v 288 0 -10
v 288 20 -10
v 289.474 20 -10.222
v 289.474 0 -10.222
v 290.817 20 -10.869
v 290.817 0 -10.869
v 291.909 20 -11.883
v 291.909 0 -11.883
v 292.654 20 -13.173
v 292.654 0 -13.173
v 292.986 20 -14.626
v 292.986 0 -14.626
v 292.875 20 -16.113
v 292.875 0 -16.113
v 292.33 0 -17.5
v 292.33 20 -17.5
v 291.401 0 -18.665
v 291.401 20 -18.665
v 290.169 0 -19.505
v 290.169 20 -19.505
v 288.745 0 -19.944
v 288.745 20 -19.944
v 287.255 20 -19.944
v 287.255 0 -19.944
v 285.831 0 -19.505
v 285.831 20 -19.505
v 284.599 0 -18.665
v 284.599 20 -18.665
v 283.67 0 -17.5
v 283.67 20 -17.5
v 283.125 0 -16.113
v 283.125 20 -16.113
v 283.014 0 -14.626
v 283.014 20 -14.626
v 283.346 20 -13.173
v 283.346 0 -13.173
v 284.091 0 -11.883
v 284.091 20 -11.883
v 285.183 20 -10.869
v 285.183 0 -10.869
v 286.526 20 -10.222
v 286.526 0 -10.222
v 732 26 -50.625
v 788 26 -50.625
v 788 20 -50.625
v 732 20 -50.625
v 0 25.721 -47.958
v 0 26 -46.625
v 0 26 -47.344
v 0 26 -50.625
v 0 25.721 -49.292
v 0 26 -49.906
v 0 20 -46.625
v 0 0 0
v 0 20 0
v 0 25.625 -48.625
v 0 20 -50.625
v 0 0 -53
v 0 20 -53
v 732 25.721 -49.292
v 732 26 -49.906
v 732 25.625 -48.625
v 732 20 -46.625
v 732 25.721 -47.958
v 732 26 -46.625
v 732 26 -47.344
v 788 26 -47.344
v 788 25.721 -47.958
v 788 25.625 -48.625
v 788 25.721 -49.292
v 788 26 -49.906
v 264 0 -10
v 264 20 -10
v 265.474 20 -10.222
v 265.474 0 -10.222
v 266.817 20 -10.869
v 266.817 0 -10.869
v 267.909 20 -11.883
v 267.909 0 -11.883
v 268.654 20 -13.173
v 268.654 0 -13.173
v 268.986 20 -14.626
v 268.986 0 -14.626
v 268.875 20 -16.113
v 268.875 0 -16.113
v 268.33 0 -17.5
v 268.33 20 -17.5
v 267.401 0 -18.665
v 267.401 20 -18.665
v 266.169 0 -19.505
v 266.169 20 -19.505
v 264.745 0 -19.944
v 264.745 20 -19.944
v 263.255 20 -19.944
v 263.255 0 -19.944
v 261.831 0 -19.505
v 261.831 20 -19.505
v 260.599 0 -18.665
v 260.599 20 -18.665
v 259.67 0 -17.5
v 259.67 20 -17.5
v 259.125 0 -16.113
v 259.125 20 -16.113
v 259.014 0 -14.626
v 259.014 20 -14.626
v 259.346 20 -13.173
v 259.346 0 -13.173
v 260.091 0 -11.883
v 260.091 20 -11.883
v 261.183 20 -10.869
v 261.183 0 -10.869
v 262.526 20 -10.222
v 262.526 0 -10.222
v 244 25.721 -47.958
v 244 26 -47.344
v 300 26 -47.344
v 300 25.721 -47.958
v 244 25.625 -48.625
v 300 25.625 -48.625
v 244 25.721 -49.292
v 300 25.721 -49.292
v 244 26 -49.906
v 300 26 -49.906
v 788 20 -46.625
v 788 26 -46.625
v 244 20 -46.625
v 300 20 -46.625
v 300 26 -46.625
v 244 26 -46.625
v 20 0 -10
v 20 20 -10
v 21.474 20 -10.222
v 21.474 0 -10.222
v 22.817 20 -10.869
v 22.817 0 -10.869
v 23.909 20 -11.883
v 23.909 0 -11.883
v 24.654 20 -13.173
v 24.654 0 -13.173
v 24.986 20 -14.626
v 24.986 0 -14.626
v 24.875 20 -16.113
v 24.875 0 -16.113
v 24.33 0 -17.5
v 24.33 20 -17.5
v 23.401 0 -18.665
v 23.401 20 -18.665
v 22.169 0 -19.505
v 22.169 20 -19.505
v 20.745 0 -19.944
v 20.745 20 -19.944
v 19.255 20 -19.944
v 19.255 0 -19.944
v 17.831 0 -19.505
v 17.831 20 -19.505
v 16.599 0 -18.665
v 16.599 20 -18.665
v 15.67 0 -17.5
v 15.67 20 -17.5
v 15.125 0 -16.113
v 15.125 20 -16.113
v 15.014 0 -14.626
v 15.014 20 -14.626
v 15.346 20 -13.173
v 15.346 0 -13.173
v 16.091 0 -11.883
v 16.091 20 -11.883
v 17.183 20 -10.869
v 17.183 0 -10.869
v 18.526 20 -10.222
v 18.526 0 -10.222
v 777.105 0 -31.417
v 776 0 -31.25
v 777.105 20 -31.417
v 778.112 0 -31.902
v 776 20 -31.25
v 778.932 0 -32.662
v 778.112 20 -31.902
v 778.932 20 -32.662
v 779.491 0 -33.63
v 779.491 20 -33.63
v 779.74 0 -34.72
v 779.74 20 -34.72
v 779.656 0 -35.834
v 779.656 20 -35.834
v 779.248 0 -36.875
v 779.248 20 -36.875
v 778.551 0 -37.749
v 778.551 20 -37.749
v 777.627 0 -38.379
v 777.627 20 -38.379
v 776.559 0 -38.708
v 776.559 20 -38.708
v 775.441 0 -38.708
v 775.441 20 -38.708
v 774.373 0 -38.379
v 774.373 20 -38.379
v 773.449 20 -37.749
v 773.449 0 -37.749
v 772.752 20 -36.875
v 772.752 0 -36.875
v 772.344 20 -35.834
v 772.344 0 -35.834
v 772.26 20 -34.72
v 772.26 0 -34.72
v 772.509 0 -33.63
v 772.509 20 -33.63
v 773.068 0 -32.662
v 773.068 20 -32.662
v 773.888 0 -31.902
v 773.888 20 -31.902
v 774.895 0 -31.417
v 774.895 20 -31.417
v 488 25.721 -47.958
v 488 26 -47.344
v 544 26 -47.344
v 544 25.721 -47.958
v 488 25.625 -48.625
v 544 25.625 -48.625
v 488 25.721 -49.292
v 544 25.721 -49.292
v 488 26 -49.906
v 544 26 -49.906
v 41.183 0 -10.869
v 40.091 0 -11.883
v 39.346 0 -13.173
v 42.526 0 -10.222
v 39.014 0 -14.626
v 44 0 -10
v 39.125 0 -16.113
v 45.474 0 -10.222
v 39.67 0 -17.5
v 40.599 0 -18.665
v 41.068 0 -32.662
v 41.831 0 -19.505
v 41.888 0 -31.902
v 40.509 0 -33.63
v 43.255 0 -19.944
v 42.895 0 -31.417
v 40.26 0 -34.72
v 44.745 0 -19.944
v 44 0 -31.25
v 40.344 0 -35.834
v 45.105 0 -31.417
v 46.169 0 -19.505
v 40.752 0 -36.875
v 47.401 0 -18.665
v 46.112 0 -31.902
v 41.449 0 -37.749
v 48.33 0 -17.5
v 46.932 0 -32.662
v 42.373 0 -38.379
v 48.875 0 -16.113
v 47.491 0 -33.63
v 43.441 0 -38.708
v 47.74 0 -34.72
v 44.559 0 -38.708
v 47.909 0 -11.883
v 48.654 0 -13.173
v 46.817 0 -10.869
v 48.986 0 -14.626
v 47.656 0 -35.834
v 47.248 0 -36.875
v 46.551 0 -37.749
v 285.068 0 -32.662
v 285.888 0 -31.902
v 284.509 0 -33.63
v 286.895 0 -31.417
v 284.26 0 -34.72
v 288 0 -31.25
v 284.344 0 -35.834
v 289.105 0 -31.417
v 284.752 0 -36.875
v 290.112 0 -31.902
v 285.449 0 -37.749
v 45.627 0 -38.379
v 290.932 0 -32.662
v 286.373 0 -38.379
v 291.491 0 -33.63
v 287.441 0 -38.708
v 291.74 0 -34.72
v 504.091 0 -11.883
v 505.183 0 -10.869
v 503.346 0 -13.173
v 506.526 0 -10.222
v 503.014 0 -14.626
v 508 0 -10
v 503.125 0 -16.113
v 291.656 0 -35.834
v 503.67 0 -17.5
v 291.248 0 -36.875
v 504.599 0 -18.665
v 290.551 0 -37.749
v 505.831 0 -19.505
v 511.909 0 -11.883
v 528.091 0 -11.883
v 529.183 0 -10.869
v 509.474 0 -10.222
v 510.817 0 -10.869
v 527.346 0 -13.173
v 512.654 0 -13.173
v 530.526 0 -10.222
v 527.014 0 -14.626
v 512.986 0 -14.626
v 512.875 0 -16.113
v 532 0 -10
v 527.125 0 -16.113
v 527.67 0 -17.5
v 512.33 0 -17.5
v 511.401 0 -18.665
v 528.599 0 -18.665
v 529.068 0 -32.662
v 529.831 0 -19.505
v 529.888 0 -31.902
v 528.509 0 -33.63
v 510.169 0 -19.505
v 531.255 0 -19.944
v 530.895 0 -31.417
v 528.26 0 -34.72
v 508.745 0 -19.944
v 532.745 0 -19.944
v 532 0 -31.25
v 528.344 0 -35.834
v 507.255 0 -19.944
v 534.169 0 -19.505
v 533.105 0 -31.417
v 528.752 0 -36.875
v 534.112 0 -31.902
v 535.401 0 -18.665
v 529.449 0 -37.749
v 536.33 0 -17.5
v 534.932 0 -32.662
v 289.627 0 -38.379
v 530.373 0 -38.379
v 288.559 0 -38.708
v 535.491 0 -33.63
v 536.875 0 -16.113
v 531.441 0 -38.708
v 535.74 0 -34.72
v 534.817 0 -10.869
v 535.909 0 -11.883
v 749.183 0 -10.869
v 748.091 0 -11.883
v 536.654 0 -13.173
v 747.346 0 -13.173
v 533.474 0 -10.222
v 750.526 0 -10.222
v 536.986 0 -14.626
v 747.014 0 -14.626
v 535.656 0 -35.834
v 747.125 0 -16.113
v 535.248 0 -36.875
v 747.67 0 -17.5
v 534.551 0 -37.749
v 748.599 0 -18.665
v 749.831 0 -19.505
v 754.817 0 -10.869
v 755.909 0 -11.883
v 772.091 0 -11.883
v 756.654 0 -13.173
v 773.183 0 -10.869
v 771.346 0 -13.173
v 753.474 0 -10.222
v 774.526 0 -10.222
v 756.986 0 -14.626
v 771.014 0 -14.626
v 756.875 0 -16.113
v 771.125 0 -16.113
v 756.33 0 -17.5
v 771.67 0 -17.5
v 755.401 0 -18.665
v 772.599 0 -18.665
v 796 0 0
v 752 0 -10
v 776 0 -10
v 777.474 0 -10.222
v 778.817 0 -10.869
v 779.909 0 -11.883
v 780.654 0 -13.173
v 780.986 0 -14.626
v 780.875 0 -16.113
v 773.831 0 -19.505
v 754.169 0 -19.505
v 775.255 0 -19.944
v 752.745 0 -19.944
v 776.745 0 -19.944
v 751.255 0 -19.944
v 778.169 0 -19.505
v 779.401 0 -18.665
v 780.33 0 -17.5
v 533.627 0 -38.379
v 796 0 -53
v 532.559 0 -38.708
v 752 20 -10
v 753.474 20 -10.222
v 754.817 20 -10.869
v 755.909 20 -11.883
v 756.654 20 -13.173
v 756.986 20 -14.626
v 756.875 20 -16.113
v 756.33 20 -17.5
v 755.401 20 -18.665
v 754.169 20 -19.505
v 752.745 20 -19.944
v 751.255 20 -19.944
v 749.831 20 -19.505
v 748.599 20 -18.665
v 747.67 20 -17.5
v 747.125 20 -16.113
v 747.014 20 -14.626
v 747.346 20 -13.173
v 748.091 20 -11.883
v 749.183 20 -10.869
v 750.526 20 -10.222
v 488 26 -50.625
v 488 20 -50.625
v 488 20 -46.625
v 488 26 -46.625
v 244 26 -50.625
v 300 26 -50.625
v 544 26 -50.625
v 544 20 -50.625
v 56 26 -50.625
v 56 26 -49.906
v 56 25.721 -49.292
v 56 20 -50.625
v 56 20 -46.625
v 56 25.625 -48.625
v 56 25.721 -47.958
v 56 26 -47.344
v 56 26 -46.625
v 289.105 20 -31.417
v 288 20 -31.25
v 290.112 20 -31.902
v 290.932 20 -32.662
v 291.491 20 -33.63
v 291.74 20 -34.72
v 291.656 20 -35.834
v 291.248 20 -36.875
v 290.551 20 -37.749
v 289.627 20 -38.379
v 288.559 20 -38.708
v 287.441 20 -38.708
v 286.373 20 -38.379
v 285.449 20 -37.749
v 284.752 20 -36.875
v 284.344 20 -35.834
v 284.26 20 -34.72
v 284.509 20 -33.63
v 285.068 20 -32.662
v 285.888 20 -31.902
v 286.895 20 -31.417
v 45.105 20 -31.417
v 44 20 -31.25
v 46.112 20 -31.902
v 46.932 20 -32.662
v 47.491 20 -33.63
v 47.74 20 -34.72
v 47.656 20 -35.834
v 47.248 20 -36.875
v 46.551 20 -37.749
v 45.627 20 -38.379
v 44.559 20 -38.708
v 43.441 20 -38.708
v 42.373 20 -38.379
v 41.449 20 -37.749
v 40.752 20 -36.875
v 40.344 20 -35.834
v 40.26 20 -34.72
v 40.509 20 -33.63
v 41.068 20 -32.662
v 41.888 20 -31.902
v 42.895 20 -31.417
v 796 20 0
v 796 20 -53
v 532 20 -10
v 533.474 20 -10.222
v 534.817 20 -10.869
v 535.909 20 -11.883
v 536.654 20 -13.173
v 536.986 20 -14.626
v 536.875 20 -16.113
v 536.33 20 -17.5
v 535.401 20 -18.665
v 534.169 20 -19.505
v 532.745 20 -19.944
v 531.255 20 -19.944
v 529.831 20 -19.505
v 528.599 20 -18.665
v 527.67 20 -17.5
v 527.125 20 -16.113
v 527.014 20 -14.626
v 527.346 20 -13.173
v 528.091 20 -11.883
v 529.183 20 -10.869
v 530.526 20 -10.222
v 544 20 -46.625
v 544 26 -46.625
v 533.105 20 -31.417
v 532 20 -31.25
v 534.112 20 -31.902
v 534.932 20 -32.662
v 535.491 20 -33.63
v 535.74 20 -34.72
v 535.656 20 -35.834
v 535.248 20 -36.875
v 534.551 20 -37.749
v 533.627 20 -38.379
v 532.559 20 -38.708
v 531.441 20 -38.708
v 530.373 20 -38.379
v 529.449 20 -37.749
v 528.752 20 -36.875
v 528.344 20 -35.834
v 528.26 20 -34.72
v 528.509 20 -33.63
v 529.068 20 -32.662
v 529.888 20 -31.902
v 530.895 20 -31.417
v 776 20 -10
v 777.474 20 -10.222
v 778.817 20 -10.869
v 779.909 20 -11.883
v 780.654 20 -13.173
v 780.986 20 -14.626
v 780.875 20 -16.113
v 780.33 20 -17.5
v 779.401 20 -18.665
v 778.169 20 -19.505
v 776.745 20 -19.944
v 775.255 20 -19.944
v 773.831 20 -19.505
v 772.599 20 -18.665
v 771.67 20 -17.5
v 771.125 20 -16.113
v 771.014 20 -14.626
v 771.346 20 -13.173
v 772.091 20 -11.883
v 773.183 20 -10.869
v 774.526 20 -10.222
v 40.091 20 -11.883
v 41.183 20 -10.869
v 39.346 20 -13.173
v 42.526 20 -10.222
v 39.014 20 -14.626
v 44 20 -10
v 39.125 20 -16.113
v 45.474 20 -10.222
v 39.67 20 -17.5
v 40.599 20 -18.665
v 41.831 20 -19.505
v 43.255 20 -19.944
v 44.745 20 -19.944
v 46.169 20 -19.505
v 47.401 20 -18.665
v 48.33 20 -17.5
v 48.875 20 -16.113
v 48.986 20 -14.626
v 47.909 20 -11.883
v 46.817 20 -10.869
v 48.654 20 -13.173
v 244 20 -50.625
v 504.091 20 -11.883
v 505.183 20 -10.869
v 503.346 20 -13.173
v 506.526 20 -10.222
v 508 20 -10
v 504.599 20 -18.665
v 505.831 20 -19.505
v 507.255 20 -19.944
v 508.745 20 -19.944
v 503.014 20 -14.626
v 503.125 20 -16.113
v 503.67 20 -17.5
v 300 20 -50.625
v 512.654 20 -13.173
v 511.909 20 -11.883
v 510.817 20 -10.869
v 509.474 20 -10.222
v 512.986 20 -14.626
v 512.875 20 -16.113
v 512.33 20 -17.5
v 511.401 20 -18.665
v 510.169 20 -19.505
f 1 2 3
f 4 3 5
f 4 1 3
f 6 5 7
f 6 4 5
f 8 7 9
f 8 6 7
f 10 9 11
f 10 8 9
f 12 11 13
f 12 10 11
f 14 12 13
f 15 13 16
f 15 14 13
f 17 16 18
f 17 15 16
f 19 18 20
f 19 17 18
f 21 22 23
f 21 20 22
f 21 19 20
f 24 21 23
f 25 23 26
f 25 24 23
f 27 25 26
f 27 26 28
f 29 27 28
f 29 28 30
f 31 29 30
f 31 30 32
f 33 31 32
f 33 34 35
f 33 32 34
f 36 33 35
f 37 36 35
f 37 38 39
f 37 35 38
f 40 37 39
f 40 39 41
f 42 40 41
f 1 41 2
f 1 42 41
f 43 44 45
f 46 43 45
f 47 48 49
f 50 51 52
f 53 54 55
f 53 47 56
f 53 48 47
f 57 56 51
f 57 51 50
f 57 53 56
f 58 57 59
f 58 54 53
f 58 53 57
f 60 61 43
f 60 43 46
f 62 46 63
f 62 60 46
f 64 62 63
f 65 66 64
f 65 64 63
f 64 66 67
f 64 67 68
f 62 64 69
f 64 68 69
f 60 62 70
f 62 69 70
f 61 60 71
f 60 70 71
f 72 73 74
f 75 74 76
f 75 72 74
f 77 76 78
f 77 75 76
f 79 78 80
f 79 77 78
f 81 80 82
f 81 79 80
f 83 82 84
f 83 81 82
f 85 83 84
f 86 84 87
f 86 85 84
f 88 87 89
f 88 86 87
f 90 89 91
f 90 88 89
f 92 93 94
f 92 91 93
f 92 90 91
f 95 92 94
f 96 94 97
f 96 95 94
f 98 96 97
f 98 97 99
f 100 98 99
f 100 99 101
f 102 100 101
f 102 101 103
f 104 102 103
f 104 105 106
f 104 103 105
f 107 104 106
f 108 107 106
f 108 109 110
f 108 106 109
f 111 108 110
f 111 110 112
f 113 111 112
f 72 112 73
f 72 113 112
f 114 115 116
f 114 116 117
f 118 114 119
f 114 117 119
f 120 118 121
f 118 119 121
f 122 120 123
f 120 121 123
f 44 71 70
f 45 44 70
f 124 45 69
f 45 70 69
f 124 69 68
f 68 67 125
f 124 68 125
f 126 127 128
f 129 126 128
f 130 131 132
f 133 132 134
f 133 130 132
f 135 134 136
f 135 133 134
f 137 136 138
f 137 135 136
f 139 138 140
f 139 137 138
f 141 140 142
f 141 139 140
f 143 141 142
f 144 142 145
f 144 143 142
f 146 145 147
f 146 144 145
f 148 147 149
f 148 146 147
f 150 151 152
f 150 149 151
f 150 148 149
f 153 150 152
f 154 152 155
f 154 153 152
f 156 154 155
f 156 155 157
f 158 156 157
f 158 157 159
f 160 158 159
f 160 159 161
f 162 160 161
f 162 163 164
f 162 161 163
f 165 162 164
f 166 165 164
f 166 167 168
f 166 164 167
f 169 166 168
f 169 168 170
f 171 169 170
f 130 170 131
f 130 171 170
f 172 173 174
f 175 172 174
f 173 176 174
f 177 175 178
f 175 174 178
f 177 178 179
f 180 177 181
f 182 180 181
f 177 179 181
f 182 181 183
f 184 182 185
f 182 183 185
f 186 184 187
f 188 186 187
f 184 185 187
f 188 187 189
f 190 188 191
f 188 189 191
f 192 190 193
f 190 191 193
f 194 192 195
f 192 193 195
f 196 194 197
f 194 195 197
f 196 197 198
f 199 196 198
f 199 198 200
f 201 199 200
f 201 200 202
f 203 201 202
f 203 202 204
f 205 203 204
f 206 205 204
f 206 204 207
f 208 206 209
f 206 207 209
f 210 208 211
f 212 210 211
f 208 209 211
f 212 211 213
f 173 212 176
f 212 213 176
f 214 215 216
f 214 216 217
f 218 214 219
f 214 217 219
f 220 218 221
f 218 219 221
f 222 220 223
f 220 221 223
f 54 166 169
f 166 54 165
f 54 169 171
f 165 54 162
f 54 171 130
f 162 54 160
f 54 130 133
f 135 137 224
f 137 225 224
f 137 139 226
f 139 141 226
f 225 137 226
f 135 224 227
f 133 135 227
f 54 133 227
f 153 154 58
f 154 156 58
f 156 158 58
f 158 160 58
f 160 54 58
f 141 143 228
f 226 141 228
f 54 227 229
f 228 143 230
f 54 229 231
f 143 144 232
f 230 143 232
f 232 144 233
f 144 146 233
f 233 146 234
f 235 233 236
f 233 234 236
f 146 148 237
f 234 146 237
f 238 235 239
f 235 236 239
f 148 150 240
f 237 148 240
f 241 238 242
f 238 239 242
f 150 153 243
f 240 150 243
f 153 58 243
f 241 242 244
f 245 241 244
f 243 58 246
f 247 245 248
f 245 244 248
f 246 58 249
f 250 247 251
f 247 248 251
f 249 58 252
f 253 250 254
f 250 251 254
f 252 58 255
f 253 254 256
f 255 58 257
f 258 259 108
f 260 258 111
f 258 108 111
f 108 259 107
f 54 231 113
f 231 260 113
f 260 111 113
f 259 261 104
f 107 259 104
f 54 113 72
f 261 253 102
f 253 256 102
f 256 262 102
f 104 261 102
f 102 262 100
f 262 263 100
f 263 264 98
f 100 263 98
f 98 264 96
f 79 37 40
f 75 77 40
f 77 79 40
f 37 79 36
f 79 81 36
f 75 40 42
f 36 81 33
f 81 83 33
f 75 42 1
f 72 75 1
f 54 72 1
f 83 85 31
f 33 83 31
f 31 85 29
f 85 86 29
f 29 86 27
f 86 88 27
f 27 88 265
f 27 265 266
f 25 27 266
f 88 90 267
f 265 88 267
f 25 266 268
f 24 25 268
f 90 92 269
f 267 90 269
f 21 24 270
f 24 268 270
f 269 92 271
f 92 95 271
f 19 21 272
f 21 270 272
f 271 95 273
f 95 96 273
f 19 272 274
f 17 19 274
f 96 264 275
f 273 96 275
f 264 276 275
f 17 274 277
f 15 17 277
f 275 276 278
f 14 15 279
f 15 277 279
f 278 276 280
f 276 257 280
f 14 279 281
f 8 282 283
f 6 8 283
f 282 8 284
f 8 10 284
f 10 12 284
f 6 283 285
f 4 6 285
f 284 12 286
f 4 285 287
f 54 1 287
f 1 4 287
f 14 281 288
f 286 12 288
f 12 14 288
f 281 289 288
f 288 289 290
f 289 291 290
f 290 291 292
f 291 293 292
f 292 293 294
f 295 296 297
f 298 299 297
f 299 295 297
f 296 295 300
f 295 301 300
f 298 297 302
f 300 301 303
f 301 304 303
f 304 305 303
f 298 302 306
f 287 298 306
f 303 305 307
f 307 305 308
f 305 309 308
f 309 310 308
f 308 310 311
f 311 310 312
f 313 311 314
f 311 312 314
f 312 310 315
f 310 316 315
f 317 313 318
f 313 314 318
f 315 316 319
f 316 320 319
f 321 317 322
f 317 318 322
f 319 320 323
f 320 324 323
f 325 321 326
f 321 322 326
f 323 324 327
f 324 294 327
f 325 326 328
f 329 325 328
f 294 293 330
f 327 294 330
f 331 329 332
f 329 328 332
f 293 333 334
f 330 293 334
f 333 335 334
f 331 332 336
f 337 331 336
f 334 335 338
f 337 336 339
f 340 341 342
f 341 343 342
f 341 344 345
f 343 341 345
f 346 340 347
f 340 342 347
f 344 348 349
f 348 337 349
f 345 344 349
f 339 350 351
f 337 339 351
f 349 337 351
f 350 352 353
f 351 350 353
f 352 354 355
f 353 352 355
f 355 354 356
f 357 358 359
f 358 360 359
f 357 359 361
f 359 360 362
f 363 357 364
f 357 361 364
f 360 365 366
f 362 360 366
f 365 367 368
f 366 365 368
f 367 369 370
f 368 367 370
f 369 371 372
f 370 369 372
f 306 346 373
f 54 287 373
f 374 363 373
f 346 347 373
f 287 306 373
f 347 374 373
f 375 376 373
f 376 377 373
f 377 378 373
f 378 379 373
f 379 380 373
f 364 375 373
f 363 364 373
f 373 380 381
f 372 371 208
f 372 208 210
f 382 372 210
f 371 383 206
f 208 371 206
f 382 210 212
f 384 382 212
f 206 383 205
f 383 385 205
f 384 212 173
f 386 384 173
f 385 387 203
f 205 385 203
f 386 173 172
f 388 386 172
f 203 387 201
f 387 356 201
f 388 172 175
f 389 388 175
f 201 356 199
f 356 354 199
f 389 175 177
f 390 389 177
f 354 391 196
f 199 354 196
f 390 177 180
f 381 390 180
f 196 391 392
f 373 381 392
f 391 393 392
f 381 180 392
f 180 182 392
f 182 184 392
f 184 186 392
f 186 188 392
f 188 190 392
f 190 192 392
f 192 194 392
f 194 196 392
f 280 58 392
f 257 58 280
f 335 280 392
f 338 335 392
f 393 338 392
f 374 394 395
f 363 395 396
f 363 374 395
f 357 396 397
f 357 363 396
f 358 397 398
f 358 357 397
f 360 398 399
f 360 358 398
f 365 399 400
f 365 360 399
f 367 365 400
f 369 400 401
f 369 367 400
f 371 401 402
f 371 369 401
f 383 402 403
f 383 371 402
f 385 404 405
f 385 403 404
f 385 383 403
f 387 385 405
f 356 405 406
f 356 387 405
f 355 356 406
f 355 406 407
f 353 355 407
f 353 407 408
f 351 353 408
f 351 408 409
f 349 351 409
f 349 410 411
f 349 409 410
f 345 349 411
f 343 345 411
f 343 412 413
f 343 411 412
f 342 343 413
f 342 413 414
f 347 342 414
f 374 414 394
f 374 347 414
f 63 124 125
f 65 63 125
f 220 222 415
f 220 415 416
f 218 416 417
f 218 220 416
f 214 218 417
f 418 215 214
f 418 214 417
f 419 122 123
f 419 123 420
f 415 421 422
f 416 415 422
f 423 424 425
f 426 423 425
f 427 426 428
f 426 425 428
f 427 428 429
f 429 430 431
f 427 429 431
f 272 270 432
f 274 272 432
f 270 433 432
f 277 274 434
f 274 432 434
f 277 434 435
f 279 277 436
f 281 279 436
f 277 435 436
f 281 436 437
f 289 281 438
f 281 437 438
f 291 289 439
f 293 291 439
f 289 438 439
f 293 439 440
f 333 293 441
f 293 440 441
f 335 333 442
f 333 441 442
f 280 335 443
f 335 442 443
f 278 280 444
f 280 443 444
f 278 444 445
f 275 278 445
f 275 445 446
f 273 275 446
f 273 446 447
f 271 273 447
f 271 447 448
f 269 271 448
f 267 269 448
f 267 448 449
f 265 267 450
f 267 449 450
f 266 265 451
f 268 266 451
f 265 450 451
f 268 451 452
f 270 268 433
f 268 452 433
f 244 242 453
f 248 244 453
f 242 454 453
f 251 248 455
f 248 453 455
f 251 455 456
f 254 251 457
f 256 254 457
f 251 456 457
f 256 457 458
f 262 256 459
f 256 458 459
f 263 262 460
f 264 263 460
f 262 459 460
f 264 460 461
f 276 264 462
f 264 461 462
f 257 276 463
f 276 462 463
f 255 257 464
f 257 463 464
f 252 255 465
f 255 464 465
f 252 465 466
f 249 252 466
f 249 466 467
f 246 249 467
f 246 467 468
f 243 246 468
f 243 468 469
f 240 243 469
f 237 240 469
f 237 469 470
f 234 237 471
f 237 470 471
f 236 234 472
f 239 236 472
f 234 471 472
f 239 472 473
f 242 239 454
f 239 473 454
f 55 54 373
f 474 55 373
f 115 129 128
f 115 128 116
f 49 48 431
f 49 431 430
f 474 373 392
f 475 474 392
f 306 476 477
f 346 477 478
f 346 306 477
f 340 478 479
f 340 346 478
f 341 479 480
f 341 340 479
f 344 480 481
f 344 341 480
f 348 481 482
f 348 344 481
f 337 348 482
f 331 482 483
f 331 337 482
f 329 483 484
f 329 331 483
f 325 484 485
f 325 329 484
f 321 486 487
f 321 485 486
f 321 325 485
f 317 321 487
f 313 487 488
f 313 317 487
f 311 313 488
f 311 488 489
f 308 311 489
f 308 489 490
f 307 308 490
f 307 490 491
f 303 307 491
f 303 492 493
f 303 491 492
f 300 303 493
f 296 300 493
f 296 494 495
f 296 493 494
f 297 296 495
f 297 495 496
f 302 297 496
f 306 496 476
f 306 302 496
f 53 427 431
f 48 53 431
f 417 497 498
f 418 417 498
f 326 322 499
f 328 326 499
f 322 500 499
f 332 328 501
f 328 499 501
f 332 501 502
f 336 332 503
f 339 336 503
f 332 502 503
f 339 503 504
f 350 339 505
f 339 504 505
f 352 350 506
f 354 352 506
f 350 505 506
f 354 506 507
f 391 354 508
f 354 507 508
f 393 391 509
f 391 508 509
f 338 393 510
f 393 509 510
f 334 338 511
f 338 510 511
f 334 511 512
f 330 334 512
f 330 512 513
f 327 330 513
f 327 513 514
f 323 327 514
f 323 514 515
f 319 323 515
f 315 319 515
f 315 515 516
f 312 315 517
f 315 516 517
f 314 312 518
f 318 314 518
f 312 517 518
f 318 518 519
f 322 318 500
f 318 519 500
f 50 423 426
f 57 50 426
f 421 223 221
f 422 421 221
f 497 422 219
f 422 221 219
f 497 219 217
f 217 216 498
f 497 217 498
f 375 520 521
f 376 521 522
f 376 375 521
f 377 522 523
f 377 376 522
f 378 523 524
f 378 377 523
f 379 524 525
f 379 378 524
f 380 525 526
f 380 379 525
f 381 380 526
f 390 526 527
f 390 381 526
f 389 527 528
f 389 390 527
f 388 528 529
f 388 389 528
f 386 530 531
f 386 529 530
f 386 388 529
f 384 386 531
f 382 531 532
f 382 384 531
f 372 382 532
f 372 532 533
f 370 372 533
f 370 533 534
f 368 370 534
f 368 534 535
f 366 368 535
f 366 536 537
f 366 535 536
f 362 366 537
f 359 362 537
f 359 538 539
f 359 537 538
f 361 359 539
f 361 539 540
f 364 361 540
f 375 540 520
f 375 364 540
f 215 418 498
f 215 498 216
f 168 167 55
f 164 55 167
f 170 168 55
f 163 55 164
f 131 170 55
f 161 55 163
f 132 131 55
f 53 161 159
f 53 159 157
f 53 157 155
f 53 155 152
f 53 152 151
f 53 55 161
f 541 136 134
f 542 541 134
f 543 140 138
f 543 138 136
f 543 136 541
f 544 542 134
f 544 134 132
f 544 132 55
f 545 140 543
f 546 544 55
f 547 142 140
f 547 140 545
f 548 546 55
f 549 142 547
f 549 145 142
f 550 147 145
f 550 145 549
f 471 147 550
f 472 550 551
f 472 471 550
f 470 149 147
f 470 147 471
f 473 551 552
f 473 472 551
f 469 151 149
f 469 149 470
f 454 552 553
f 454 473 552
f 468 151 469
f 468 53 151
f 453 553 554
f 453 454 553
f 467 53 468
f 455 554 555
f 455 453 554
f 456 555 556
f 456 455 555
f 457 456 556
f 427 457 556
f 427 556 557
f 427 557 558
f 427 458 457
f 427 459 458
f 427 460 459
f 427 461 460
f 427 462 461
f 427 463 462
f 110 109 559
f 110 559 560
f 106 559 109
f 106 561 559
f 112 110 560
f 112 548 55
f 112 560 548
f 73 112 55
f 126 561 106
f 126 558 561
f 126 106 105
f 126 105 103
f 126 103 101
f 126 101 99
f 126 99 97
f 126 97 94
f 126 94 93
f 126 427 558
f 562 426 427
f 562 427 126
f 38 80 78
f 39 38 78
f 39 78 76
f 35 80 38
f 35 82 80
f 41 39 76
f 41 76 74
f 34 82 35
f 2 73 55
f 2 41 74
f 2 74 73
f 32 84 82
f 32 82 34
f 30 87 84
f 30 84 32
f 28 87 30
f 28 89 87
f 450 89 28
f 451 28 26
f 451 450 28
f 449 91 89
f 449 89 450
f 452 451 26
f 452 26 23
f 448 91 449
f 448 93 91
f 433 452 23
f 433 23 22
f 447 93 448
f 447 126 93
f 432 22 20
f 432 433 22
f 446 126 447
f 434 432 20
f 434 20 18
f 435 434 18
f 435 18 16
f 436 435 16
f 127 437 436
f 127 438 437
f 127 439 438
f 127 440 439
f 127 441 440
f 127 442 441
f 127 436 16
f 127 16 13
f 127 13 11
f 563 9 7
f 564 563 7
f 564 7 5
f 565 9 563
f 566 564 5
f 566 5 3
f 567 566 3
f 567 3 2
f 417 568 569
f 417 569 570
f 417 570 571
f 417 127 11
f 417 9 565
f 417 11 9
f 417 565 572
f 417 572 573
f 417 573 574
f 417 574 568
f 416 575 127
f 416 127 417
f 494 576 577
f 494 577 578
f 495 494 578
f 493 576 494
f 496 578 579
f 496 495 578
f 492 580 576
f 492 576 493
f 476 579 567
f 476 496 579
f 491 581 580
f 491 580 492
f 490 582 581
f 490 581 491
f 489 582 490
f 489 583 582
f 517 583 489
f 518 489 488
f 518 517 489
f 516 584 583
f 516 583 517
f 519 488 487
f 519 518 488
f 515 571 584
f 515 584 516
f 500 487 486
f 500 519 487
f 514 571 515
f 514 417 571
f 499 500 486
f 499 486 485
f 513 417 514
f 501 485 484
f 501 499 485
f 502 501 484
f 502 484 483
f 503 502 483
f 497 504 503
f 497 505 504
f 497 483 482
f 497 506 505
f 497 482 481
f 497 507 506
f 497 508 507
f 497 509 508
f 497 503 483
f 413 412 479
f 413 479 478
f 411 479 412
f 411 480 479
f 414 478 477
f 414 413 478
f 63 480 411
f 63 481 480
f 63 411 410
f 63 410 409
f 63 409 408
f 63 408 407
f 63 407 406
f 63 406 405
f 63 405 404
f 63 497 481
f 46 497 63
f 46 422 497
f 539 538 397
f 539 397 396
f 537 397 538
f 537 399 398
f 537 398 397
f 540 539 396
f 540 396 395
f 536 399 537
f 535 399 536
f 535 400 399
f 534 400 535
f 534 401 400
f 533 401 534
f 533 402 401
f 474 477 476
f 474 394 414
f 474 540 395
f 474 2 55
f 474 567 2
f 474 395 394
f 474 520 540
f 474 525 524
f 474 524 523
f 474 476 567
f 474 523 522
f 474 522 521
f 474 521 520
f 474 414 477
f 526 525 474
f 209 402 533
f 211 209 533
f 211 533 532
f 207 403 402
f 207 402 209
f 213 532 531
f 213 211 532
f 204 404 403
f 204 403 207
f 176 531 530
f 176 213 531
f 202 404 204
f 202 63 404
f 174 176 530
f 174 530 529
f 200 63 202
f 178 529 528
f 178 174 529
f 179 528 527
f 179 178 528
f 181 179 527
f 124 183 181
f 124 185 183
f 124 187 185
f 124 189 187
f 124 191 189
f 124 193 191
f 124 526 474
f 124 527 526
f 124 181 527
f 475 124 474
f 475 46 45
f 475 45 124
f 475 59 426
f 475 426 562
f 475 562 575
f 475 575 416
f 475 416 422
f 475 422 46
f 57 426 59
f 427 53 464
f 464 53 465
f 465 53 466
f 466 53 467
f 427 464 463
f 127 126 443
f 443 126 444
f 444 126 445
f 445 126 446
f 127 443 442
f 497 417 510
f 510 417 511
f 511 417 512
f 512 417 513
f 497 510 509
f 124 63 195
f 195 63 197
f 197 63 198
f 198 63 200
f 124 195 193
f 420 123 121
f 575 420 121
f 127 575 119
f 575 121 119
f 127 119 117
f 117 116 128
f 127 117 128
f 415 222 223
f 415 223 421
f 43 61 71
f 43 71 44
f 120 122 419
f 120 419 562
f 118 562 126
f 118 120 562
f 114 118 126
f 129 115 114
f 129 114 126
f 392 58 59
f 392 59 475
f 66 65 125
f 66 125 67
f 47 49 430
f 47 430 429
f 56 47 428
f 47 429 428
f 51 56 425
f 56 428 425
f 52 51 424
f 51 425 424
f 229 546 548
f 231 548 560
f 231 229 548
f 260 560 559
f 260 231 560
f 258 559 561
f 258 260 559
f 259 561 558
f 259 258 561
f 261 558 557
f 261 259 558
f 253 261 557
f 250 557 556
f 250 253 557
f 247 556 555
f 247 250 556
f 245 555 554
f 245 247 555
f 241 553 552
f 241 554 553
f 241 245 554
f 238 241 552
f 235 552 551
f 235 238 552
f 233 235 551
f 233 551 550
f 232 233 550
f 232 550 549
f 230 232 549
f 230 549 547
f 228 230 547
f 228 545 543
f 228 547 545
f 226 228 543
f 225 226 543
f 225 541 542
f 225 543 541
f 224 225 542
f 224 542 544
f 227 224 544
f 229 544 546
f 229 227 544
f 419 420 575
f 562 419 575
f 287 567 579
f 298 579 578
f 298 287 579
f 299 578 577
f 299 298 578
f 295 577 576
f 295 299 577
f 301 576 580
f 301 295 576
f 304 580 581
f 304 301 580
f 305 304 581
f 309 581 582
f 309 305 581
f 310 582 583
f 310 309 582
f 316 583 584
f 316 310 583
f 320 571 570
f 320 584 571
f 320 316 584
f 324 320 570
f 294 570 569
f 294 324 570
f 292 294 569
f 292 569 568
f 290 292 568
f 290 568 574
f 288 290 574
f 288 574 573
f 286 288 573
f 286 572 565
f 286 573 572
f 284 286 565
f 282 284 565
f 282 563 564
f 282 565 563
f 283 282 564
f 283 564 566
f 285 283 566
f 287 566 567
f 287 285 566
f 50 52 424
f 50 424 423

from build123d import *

# Parameters (mm, degrees)
SKETCH2_W           = 796
SKETCH2_H           = 53
BOSS_EXTRUDE1_DEPTH = 20
SKETCH2_3_R         = 5
SKETCH2_3_R_2       = 3.75
CUT_EXTRUDE1_DEPTH  = 799.013157786
BOSS_EXTRUDE2_START = -8
BOSS_EXTRUDE2_DEPTH = 56
LPATTERN1_COUNT     = 4
LPATTERN1_PITCH     = 244


with BuildPart() as part:
    # Sketch2 → Boss-Extrude1 (new body)
    with BuildSketch(Plane(origin=(0, 0, 0), x_dir=(1, 0, 0), z_dir=(0, 1, 0))):
        with Locations((398, 26.5)):
            Rectangle(SKETCH2_W, SKETCH2_H)
    extrude(amount=BOSS_EXTRUDE1_DEPTH)

    # Sketch2<3> → Cut-Extrude1 (cut, symmetric)
    with BuildSketch(Plane(origin=(0, 0, 0), x_dir=(1, 0, 0), z_dir=(0, 1, 0))):
        with Locations((752, 15)):
            Circle(SKETCH2_3_R)
        with Locations((776, 35)):
            Circle(SKETCH2_3_R_2)
        with Locations((776, 15)):
            Circle(SKETCH2_3_R)
    cut_extrude1 = extrude(amount=CUT_EXTRUDE1_DEPTH, both=True, mode=Mode.SUBTRACT)

    # Sketch3 → Boss-Extrude2 (add)
    with BuildSketch(Plane(origin=(796, 0, 0), x_dir=(0, 0, -1), z_dir=(1, 0, 0)).offset(BOSS_EXTRUDE2_START)):
        with BuildLine():
            Line((50.625, 20), (46.625, 20))
            Line((46.625, 20), (46.625, 26))
            Line((46.625, 26), (47.344131154, 26))
            ThreePointArc((47.344131154, 26), (48.625, 25.625), (49.905868846, 26))
            Line((49.905868846, 26), (50.625, 26))
            Line((50.625, 26), (50.625, 20))
        make_face()
    boss_extrude2 = extrude(amount=-BOSS_EXTRUDE2_DEPTH)

    # LPattern1: Cut-Extrude1, Boss-Extrude2 ×4
    with Locations(*[(-i * LPATTERN1_PITCH, 0, 0) for i in range(1, LPATTERN1_COUNT)]):
        add(cut_extrude1, mode=Mode.SUBTRACT)
        add(boss_extrude2)


solid = part.part
